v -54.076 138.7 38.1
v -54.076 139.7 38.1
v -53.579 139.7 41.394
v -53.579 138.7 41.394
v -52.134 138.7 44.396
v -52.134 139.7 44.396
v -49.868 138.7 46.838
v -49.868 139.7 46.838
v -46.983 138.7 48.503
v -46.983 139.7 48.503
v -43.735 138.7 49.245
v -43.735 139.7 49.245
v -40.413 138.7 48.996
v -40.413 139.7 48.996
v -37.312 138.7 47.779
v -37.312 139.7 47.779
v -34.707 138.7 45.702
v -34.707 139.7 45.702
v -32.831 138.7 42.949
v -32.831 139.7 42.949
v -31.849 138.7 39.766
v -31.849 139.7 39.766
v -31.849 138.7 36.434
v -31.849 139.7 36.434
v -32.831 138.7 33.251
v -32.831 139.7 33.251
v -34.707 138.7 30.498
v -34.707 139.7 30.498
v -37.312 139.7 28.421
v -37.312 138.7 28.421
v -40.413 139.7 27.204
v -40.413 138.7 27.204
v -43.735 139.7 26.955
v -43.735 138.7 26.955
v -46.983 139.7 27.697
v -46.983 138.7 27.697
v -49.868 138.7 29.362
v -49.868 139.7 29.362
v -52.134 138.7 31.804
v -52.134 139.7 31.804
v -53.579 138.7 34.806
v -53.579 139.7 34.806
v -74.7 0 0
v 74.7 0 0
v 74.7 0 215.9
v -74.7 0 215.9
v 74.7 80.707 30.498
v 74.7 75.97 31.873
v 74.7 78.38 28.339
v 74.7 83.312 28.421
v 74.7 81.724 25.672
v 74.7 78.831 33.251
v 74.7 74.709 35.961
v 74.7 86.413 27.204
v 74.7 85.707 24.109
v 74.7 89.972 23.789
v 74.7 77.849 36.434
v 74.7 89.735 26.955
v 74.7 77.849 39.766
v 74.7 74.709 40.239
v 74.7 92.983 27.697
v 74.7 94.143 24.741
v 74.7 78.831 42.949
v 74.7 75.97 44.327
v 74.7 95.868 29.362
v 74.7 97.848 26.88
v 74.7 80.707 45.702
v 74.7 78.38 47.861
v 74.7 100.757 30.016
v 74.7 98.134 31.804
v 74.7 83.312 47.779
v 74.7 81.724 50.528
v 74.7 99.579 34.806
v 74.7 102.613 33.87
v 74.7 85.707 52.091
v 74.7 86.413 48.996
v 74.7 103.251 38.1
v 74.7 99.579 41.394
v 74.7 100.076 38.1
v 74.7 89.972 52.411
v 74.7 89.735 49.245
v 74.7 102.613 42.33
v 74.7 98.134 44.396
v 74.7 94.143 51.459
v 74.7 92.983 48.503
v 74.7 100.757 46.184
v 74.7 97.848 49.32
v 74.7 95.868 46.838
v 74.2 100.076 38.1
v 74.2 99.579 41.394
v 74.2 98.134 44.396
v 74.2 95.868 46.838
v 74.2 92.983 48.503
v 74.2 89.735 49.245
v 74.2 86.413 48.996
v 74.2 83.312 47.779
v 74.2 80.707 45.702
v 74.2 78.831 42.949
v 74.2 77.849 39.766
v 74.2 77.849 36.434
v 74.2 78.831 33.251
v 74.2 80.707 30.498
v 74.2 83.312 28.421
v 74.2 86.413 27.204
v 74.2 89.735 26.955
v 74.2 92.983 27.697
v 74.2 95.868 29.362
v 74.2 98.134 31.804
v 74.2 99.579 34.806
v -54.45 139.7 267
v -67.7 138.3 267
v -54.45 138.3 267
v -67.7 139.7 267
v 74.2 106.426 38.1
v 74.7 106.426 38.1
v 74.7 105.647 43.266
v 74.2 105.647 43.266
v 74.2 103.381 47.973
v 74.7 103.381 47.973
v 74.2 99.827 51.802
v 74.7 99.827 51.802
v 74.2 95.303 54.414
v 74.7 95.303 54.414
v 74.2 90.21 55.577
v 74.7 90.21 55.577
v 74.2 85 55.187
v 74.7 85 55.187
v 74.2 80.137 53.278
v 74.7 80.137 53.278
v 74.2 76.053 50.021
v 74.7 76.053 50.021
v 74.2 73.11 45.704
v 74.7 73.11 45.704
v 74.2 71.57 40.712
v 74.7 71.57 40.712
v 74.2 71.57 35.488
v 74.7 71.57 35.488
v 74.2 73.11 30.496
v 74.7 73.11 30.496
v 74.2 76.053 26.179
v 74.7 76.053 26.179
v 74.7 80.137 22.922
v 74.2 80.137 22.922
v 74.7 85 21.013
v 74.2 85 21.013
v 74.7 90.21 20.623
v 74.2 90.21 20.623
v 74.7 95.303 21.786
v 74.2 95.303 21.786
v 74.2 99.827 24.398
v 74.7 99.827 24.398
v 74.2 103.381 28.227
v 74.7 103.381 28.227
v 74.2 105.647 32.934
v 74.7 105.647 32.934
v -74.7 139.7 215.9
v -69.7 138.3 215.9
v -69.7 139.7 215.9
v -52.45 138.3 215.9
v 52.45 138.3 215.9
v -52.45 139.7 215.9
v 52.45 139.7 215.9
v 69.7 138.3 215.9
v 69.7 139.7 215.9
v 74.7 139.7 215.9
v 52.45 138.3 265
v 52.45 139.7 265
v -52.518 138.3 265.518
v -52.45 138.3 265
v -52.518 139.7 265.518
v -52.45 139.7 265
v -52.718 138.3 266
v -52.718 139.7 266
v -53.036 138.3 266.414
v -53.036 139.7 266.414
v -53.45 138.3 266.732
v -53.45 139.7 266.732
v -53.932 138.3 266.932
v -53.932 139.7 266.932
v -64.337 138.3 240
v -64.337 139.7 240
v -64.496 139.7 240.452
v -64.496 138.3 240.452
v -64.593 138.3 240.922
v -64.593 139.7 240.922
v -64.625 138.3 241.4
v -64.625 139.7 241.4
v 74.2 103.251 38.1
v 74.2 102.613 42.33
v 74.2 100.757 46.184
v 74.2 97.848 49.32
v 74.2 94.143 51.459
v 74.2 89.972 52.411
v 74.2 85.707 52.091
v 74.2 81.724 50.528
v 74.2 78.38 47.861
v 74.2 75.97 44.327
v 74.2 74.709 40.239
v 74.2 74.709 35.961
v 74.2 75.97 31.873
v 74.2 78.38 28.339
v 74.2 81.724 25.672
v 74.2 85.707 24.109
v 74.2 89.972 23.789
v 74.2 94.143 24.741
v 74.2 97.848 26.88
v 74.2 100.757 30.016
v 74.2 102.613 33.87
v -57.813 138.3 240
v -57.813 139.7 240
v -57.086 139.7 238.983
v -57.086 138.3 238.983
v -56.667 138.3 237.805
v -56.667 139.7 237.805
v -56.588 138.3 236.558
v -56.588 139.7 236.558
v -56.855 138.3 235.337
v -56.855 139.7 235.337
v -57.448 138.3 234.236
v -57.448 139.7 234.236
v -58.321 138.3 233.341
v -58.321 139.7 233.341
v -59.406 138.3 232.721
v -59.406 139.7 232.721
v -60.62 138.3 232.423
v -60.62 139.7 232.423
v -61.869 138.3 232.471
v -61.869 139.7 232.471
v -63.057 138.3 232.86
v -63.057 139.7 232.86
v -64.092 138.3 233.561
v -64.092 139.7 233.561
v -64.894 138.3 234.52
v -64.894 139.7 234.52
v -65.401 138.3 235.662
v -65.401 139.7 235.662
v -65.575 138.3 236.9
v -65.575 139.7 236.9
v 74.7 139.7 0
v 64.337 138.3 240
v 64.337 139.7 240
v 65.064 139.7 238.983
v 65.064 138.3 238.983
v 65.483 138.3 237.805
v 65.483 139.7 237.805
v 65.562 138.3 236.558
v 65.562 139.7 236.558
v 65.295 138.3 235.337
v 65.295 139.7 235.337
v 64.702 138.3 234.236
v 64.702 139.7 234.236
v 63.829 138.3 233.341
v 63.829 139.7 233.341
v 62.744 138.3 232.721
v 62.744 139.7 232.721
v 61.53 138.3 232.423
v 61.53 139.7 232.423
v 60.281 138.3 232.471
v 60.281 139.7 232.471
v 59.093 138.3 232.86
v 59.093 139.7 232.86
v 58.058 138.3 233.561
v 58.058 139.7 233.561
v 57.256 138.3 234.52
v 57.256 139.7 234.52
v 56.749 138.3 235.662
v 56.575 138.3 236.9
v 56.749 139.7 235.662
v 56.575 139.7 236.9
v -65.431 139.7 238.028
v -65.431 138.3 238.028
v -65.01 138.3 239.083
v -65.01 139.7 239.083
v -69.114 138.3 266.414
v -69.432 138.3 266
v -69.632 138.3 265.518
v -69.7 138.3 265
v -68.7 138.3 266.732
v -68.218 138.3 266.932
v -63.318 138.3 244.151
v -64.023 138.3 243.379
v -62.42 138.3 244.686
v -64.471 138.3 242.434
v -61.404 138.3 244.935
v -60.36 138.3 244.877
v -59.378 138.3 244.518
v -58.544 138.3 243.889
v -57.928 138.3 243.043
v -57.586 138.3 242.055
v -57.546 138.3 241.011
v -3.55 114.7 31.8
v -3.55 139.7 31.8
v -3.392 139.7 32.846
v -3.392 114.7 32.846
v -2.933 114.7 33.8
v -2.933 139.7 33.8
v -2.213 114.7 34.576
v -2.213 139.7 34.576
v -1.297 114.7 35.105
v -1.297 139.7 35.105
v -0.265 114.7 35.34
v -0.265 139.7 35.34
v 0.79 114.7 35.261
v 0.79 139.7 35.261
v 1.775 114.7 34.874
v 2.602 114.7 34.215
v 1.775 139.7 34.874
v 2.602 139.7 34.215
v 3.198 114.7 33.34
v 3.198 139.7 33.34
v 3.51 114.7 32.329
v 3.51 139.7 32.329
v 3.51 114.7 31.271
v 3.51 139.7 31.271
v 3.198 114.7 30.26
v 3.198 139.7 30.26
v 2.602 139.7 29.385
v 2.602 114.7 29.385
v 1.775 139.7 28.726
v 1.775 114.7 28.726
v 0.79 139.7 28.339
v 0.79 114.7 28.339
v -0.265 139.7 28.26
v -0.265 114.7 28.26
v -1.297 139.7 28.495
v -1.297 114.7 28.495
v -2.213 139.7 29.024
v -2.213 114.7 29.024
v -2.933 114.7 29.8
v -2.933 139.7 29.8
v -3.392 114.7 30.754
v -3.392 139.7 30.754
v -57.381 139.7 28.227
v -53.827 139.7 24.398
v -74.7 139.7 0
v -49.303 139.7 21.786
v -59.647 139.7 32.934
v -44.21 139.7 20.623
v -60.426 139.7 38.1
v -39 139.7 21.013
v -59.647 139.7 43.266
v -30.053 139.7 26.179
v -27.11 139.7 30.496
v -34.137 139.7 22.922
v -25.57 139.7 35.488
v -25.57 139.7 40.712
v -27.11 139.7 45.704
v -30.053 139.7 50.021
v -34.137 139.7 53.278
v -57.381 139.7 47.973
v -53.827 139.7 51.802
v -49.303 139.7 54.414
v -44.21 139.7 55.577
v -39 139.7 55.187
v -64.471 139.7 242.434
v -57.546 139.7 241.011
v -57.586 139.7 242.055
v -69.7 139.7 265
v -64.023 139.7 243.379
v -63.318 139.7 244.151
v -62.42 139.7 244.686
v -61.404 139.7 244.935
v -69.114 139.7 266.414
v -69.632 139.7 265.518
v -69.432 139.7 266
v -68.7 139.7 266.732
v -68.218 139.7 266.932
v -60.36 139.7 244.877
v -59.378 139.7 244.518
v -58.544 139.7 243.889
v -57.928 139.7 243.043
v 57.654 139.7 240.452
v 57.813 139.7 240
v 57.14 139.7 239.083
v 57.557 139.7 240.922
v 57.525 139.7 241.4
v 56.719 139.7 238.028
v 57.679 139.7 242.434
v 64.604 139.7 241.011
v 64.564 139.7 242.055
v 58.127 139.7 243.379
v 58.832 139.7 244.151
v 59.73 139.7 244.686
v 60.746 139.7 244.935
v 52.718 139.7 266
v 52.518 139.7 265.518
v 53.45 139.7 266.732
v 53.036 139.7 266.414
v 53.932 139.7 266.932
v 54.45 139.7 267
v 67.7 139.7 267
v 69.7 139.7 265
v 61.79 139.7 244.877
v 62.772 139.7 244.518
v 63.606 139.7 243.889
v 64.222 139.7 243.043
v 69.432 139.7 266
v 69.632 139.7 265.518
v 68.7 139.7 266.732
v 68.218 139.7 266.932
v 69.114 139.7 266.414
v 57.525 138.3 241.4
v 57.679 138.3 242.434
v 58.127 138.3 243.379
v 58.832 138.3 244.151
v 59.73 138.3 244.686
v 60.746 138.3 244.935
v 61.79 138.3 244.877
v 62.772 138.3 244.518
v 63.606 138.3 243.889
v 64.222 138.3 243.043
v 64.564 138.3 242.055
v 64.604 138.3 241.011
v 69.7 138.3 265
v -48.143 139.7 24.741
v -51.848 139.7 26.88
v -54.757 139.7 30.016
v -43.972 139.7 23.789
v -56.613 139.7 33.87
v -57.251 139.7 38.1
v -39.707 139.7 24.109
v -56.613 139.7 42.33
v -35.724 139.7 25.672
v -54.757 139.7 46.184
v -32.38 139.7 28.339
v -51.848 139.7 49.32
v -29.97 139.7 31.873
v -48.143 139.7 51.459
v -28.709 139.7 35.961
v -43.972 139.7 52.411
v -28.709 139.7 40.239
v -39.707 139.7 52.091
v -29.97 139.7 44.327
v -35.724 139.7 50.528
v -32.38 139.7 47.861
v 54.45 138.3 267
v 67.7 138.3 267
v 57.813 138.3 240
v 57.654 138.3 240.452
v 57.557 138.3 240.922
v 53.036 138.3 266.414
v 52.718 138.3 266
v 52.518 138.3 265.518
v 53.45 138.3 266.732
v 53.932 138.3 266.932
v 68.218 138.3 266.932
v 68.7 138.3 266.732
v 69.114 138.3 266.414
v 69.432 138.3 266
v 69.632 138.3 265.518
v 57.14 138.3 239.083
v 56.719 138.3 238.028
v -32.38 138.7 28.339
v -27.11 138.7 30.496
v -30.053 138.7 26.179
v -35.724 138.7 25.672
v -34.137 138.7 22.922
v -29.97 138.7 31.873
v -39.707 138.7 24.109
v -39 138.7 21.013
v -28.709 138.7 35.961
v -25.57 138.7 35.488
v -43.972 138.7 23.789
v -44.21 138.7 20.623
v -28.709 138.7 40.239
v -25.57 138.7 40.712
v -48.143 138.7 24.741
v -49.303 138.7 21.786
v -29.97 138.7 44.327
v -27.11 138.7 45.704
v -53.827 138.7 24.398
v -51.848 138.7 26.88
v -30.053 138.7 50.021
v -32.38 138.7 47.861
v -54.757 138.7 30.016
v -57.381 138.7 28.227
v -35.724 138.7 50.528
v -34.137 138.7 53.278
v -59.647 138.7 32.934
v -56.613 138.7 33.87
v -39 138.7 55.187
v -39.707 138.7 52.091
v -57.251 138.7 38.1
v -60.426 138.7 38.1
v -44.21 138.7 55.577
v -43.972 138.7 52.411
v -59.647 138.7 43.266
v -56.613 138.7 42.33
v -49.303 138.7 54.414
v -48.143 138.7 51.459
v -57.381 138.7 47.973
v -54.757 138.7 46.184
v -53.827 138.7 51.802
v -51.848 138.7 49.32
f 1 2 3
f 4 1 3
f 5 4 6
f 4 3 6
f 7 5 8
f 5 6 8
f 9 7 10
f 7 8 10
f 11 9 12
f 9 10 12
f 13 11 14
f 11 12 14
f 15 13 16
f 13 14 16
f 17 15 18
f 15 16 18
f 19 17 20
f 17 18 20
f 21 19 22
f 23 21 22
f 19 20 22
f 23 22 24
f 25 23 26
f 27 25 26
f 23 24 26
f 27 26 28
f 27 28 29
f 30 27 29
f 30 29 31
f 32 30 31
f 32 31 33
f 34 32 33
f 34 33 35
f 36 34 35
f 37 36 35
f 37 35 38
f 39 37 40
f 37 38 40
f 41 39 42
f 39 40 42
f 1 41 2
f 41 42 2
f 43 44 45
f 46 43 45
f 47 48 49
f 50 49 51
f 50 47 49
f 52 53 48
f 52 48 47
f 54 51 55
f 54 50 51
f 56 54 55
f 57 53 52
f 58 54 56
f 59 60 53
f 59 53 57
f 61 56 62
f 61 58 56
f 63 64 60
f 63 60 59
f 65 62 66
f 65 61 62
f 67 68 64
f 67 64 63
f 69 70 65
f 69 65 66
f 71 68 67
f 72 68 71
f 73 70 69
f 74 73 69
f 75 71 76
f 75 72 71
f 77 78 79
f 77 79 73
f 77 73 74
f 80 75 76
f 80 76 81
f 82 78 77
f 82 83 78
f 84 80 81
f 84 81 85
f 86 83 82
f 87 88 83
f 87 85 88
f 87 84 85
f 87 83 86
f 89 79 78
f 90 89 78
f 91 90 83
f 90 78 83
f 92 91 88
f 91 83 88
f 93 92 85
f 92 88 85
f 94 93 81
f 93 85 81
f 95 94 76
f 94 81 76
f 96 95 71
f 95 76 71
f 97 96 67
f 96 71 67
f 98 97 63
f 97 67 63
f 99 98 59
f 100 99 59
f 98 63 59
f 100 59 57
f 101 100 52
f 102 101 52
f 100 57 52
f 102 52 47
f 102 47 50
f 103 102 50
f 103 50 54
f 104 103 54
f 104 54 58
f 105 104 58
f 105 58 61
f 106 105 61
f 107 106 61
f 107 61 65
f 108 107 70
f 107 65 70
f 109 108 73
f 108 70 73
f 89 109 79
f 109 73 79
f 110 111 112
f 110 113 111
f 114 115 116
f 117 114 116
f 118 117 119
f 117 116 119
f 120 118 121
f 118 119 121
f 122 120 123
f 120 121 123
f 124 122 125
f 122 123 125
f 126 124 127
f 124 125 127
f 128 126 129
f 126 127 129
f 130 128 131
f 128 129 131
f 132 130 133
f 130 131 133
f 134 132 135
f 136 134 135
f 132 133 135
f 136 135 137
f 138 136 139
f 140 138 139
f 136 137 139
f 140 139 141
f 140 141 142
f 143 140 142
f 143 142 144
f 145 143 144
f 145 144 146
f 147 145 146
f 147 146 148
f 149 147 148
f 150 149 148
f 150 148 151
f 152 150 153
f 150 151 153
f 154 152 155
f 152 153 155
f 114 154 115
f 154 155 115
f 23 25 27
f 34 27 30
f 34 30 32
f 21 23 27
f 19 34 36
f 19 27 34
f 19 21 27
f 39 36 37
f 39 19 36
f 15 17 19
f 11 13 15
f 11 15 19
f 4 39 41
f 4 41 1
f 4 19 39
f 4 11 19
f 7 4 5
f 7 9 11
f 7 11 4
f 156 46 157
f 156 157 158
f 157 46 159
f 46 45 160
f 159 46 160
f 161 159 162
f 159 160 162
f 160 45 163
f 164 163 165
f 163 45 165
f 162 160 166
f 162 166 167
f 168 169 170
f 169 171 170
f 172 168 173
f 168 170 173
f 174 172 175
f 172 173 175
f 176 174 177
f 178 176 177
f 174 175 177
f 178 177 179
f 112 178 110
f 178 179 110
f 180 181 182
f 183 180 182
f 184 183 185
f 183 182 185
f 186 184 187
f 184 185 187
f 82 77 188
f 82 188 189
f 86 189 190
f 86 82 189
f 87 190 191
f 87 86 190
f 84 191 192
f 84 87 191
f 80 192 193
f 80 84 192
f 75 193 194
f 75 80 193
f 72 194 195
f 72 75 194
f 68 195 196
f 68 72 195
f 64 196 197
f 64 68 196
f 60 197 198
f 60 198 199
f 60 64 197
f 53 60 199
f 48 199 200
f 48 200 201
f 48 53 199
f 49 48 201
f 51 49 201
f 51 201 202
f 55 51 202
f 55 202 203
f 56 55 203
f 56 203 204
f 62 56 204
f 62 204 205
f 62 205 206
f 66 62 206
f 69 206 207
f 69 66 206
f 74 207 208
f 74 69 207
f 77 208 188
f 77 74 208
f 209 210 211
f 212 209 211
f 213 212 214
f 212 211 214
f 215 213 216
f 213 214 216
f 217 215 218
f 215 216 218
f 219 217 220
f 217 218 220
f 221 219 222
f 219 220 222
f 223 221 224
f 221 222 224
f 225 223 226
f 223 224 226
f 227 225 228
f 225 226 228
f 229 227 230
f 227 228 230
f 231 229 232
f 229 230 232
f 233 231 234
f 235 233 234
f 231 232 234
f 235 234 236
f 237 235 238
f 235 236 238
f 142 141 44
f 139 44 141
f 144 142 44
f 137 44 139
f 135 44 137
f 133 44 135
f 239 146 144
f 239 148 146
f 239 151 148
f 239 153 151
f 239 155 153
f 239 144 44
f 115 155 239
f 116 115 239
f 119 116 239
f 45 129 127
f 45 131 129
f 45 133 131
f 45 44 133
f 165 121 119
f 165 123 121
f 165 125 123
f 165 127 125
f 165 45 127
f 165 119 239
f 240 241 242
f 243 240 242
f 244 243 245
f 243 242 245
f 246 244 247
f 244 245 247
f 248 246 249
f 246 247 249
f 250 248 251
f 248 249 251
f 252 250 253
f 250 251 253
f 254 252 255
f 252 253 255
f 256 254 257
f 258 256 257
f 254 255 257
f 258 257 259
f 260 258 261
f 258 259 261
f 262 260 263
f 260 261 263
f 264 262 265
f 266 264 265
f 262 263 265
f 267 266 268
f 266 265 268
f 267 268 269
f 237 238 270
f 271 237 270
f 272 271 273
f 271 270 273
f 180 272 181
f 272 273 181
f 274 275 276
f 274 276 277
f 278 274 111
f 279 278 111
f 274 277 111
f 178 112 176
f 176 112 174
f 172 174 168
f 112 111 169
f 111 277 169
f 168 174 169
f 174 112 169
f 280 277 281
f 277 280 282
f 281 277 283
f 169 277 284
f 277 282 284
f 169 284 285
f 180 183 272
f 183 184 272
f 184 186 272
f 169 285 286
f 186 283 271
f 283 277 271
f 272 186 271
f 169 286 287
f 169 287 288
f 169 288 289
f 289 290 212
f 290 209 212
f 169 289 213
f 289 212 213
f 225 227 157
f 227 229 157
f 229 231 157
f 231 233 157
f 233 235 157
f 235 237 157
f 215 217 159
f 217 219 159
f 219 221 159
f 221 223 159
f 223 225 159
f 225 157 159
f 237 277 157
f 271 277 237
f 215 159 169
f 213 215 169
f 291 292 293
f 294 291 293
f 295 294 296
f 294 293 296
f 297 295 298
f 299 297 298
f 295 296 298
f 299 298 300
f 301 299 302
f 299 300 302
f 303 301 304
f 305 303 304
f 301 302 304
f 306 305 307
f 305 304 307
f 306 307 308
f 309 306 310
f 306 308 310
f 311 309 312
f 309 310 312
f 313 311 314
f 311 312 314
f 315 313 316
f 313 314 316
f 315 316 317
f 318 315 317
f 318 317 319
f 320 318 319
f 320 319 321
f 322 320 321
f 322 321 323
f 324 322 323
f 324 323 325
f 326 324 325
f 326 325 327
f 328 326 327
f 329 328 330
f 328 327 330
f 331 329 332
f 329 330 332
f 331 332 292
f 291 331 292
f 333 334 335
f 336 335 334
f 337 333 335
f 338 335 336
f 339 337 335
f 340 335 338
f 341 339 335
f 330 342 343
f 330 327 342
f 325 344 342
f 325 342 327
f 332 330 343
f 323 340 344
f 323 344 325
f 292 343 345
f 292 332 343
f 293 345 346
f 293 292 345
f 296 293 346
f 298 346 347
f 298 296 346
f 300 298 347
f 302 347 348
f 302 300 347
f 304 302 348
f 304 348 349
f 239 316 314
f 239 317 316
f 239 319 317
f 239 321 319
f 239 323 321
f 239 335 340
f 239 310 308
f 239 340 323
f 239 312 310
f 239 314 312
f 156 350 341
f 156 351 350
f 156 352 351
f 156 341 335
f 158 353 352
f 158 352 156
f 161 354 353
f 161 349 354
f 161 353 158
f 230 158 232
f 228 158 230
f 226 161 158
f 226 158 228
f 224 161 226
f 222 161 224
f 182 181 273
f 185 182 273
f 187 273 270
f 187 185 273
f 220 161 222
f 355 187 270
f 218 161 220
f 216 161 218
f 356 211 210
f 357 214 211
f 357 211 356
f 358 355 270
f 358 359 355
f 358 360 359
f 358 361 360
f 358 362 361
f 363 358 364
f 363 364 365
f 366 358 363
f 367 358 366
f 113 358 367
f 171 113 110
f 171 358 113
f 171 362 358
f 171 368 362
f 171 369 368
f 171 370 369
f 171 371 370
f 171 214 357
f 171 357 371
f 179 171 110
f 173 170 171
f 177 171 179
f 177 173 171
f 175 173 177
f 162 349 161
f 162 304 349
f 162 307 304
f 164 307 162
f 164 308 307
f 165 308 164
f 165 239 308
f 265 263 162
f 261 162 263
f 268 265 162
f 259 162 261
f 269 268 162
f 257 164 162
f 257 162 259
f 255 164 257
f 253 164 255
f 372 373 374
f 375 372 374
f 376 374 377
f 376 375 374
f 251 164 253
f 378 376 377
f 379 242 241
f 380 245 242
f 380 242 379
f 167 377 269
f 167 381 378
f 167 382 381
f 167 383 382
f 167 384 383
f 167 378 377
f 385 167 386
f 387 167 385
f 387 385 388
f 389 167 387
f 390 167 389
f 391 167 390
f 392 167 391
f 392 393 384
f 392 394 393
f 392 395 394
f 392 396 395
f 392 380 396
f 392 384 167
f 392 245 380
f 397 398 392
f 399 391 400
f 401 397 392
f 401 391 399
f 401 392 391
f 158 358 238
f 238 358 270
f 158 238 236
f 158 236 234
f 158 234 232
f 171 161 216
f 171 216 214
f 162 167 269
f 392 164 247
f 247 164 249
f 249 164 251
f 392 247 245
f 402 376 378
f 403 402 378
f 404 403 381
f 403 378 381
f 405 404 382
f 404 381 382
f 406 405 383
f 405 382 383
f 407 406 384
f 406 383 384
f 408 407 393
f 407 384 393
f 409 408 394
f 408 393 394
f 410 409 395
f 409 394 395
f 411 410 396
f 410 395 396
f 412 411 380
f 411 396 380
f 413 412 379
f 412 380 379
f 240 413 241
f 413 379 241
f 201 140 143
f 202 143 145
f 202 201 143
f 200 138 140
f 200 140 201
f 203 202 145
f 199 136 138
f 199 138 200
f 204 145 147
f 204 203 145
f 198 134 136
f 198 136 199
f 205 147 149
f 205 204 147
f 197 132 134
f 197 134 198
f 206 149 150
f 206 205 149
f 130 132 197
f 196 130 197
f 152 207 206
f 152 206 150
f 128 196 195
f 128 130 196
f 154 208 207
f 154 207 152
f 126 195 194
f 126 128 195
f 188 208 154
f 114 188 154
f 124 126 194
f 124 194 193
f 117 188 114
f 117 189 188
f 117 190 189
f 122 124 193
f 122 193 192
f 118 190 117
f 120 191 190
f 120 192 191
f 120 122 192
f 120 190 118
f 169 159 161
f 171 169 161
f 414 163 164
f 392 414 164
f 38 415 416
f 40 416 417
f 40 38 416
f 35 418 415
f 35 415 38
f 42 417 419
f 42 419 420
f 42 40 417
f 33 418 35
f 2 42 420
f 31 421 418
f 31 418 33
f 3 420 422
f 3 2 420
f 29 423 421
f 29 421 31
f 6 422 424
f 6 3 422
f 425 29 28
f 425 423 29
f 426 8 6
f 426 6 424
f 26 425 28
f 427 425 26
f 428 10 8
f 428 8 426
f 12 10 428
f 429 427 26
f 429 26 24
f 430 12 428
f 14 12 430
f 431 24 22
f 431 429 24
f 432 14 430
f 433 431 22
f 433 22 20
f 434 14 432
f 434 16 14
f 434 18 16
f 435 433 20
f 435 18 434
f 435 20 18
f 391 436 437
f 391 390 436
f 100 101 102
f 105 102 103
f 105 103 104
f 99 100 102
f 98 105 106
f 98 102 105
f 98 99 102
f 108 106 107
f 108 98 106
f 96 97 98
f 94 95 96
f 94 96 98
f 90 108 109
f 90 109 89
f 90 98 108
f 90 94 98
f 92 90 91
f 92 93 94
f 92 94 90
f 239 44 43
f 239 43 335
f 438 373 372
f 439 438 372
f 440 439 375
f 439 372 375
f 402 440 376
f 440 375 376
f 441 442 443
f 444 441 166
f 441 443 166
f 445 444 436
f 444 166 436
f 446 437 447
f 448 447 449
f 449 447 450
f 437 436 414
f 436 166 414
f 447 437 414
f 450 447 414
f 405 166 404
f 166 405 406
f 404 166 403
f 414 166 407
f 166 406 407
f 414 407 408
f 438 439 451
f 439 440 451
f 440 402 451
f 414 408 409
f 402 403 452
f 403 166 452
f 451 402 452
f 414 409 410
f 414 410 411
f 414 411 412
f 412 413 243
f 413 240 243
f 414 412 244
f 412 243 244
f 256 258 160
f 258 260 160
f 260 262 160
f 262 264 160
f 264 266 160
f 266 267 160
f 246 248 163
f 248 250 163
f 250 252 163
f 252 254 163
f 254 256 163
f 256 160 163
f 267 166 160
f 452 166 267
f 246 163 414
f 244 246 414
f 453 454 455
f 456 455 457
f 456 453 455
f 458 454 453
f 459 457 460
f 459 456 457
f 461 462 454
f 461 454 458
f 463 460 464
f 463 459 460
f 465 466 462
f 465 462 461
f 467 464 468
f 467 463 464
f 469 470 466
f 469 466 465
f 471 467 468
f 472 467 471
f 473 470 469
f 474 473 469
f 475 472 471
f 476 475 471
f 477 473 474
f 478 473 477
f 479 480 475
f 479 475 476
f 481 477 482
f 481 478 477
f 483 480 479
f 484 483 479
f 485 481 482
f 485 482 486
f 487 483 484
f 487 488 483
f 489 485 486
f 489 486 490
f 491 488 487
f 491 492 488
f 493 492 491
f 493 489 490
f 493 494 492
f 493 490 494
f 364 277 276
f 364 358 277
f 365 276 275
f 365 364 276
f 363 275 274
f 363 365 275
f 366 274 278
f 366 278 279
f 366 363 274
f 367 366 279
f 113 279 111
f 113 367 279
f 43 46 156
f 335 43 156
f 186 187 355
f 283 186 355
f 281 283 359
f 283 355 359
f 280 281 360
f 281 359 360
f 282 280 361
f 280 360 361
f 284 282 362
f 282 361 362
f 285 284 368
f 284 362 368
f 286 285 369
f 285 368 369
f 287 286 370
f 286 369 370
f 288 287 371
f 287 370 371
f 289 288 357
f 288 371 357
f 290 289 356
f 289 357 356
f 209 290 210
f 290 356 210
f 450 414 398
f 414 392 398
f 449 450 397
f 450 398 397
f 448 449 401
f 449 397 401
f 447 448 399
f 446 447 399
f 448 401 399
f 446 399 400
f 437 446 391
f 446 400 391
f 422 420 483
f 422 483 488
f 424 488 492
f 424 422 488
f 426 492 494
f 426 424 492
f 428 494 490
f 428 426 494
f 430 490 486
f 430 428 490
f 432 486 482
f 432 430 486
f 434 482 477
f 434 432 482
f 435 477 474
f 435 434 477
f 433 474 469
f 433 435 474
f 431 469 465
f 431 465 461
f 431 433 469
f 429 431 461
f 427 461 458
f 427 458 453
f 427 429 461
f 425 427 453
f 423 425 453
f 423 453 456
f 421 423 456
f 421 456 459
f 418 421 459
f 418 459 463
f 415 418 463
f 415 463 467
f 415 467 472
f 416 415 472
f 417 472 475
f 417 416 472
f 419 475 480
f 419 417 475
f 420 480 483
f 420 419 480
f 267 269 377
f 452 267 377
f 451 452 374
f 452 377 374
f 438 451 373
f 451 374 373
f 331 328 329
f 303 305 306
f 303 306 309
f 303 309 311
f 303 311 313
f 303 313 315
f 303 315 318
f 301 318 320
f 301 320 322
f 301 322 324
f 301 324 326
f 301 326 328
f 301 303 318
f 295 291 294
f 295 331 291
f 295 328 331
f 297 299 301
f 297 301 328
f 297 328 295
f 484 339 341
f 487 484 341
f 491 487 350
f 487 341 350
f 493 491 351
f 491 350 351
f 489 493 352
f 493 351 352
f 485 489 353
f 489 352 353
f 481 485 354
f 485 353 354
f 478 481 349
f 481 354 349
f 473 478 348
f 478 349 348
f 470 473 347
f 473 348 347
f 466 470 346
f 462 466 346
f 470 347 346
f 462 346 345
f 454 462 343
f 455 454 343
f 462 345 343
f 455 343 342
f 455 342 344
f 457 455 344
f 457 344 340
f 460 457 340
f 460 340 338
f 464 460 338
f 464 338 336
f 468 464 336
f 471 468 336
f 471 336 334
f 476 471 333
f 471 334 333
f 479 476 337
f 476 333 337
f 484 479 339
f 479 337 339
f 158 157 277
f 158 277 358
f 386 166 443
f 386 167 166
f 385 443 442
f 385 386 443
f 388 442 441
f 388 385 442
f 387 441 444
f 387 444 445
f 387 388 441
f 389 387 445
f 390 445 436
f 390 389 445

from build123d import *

# Parameters (mm, degrees)
F0_W      = 139.7
F0_H      = 215.9
F1_DEPTH  = 74.7
F2_R      = 17.526
F2_R_2    = 14.351
F2_R_3    = 11.176
F3_DEPTH  = 0.5
F4_R      = 17.526
F4_R_2    = 14.351
F4_R_3    = 11.176
F5_DEPTH  = 1
F4_R_4    = 3.55
F6_DEPTH  = 25
F7_W      = 17.25
F7_H      = 1.4
F8_DEPTH  = 51.1
F10_DEPTH = 139.701
F11_R     = 2


with BuildPart() as f1:
    # F0 (on Right) → F1 (new body, symmetric)
    with BuildSketch(Plane.YZ):
        with Locations((69.85, 107.95)):
            Rectangle(F0_W, F0_H)
    extrude(amount=F1_DEPTH, both=True)

    # F2 (on face) → F3 (cut)
    with BuildSketch(Plane.YZ.offset(74.7)):
        with Locations((88.9, 38.1)):
            Circle(F2_R)
        with Locations((88.9, 38.1)):
            Circle(F2_R_2, mode=Mode.SUBTRACT)
        with Locations((88.9, 38.1)):
            Circle(F2_R_3)
    extrude(amount=-F3_DEPTH, mode=Mode.SUBTRACT)

    # F4 (on face) → F5 (cut)
    with BuildSketch(Plane(origin=(0, 139.7, 0), x_dir=(-1, 0, 0), z_dir=(0, 1, 0))):
        with Locations((42.9, 38.1)):
            Circle(F4_R)
        with Locations((42.9, 38.1)):
            Circle(F4_R_2, mode=Mode.SUBTRACT)
        with Locations((42.9, 38.1)):
            Circle(F4_R_3)
    extrude(amount=-F5_DEPTH, mode=Mode.SUBTRACT)

    # F4 (on face) → F6 (cut)
    with BuildSketch(Plane(origin=(0, 139.7, 0), x_dir=(-1, 0, 0), z_dir=(0, 1, 0))):
        with Locations((0, 31.8)):
            Circle(F4_R_4)
    extrude(amount=-F6_DEPTH, mode=Mode.SUBTRACT)

    # F7 (on face) → F8 (join)
    with BuildSketch(Plane.XY.offset(215.9)):
        with Locations((61.075, 139)):
            Rectangle(F7_W, F7_H)
        with Locations((-61.075, 139)):
            Rectangle(F7_W, F7_H)
    extrude(amount=F8_DEPTH)

    # F9 (on face) → F10 (cut, through all)
    with BuildSketch(Plane(origin=(0, 139.7, 0), x_dir=(-1, 0, 0), z_dir=(0, 1, 0))):
        with BuildLine():
            ThreePointArc((-57.812835, 239.999722), (-57.597703, 240.685223), (-57.525, 241.4))
            ThreePointArc((-57.525, 241.4), (-61.789777, 244.877297), (-64.337165, 239.999722))
            ThreePointArc((-64.337165, 239.999722), (-61.075, 241.4), (-57.812835, 239.999722))
        make_face()
        with BuildLine():
            ThreePointArc((-57.812835, 239.999722), (-61.075, 241.4), (-64.337165, 239.999722))
            ThreePointArc((-64.337165, 239.999722), (-61.075, 237.85), (-57.812835, 239.999722))
        make_face()
        with BuildLine():
            ThreePointArc((-57.812835, 239.999722), (-61.075, 237.85), (-64.337165, 239.999722))
            ThreePointArc((-64.337165, 239.999722), (-62.74387, 232.720901), (-56.575, 236.9))
            ThreePointArc((-56.575, 236.9), (-56.895901, 238.56887), (-57.812835, 239.999722))
        make_face()
        with BuildLine():
            ThreePointArc((64.337165, 239.999722), (64.552297, 240.685223), (64.625, 241.4))
            ThreePointArc((64.625, 241.4), (60.360223, 244.877297), (57.812835, 239.999722))
            ThreePointArc((57.812835, 239.999722), (61.075, 241.4), (64.337165, 239.999722))
        make_face()
        with BuildLine():
            ThreePointArc((64.337165, 239.999722), (61.075, 241.4), (57.812835, 239.999722))
            ThreePointArc((57.812835, 239.999722), (61.075, 237.85), (64.337165, 239.999722))
        make_face()
        with BuildLine():
            ThreePointArc((64.337165, 239.999722), (61.075, 237.85), (57.812835, 239.999722))
            ThreePointArc((57.812835, 239.999722), (59.40613, 232.720901), (65.575, 236.9))
            ThreePointArc((65.575, 236.9), (65.254099, 238.56887), (64.337165, 239.999722))
        make_face()
    extrude(amount=-F10_DEPTH, mode=Mode.SUBTRACT)

    # F11
    f11_edges = [f1.edges().sort_by_distance(p)[0] for p in [
        (-52.45, 139, 267),
        (-69.7, 139, 267),
        (69.7, 139, 267),
        (52.45, 139, 267),
    ]]
    fillet(f11_edges, radius=F11_R)


solid = f1.part
